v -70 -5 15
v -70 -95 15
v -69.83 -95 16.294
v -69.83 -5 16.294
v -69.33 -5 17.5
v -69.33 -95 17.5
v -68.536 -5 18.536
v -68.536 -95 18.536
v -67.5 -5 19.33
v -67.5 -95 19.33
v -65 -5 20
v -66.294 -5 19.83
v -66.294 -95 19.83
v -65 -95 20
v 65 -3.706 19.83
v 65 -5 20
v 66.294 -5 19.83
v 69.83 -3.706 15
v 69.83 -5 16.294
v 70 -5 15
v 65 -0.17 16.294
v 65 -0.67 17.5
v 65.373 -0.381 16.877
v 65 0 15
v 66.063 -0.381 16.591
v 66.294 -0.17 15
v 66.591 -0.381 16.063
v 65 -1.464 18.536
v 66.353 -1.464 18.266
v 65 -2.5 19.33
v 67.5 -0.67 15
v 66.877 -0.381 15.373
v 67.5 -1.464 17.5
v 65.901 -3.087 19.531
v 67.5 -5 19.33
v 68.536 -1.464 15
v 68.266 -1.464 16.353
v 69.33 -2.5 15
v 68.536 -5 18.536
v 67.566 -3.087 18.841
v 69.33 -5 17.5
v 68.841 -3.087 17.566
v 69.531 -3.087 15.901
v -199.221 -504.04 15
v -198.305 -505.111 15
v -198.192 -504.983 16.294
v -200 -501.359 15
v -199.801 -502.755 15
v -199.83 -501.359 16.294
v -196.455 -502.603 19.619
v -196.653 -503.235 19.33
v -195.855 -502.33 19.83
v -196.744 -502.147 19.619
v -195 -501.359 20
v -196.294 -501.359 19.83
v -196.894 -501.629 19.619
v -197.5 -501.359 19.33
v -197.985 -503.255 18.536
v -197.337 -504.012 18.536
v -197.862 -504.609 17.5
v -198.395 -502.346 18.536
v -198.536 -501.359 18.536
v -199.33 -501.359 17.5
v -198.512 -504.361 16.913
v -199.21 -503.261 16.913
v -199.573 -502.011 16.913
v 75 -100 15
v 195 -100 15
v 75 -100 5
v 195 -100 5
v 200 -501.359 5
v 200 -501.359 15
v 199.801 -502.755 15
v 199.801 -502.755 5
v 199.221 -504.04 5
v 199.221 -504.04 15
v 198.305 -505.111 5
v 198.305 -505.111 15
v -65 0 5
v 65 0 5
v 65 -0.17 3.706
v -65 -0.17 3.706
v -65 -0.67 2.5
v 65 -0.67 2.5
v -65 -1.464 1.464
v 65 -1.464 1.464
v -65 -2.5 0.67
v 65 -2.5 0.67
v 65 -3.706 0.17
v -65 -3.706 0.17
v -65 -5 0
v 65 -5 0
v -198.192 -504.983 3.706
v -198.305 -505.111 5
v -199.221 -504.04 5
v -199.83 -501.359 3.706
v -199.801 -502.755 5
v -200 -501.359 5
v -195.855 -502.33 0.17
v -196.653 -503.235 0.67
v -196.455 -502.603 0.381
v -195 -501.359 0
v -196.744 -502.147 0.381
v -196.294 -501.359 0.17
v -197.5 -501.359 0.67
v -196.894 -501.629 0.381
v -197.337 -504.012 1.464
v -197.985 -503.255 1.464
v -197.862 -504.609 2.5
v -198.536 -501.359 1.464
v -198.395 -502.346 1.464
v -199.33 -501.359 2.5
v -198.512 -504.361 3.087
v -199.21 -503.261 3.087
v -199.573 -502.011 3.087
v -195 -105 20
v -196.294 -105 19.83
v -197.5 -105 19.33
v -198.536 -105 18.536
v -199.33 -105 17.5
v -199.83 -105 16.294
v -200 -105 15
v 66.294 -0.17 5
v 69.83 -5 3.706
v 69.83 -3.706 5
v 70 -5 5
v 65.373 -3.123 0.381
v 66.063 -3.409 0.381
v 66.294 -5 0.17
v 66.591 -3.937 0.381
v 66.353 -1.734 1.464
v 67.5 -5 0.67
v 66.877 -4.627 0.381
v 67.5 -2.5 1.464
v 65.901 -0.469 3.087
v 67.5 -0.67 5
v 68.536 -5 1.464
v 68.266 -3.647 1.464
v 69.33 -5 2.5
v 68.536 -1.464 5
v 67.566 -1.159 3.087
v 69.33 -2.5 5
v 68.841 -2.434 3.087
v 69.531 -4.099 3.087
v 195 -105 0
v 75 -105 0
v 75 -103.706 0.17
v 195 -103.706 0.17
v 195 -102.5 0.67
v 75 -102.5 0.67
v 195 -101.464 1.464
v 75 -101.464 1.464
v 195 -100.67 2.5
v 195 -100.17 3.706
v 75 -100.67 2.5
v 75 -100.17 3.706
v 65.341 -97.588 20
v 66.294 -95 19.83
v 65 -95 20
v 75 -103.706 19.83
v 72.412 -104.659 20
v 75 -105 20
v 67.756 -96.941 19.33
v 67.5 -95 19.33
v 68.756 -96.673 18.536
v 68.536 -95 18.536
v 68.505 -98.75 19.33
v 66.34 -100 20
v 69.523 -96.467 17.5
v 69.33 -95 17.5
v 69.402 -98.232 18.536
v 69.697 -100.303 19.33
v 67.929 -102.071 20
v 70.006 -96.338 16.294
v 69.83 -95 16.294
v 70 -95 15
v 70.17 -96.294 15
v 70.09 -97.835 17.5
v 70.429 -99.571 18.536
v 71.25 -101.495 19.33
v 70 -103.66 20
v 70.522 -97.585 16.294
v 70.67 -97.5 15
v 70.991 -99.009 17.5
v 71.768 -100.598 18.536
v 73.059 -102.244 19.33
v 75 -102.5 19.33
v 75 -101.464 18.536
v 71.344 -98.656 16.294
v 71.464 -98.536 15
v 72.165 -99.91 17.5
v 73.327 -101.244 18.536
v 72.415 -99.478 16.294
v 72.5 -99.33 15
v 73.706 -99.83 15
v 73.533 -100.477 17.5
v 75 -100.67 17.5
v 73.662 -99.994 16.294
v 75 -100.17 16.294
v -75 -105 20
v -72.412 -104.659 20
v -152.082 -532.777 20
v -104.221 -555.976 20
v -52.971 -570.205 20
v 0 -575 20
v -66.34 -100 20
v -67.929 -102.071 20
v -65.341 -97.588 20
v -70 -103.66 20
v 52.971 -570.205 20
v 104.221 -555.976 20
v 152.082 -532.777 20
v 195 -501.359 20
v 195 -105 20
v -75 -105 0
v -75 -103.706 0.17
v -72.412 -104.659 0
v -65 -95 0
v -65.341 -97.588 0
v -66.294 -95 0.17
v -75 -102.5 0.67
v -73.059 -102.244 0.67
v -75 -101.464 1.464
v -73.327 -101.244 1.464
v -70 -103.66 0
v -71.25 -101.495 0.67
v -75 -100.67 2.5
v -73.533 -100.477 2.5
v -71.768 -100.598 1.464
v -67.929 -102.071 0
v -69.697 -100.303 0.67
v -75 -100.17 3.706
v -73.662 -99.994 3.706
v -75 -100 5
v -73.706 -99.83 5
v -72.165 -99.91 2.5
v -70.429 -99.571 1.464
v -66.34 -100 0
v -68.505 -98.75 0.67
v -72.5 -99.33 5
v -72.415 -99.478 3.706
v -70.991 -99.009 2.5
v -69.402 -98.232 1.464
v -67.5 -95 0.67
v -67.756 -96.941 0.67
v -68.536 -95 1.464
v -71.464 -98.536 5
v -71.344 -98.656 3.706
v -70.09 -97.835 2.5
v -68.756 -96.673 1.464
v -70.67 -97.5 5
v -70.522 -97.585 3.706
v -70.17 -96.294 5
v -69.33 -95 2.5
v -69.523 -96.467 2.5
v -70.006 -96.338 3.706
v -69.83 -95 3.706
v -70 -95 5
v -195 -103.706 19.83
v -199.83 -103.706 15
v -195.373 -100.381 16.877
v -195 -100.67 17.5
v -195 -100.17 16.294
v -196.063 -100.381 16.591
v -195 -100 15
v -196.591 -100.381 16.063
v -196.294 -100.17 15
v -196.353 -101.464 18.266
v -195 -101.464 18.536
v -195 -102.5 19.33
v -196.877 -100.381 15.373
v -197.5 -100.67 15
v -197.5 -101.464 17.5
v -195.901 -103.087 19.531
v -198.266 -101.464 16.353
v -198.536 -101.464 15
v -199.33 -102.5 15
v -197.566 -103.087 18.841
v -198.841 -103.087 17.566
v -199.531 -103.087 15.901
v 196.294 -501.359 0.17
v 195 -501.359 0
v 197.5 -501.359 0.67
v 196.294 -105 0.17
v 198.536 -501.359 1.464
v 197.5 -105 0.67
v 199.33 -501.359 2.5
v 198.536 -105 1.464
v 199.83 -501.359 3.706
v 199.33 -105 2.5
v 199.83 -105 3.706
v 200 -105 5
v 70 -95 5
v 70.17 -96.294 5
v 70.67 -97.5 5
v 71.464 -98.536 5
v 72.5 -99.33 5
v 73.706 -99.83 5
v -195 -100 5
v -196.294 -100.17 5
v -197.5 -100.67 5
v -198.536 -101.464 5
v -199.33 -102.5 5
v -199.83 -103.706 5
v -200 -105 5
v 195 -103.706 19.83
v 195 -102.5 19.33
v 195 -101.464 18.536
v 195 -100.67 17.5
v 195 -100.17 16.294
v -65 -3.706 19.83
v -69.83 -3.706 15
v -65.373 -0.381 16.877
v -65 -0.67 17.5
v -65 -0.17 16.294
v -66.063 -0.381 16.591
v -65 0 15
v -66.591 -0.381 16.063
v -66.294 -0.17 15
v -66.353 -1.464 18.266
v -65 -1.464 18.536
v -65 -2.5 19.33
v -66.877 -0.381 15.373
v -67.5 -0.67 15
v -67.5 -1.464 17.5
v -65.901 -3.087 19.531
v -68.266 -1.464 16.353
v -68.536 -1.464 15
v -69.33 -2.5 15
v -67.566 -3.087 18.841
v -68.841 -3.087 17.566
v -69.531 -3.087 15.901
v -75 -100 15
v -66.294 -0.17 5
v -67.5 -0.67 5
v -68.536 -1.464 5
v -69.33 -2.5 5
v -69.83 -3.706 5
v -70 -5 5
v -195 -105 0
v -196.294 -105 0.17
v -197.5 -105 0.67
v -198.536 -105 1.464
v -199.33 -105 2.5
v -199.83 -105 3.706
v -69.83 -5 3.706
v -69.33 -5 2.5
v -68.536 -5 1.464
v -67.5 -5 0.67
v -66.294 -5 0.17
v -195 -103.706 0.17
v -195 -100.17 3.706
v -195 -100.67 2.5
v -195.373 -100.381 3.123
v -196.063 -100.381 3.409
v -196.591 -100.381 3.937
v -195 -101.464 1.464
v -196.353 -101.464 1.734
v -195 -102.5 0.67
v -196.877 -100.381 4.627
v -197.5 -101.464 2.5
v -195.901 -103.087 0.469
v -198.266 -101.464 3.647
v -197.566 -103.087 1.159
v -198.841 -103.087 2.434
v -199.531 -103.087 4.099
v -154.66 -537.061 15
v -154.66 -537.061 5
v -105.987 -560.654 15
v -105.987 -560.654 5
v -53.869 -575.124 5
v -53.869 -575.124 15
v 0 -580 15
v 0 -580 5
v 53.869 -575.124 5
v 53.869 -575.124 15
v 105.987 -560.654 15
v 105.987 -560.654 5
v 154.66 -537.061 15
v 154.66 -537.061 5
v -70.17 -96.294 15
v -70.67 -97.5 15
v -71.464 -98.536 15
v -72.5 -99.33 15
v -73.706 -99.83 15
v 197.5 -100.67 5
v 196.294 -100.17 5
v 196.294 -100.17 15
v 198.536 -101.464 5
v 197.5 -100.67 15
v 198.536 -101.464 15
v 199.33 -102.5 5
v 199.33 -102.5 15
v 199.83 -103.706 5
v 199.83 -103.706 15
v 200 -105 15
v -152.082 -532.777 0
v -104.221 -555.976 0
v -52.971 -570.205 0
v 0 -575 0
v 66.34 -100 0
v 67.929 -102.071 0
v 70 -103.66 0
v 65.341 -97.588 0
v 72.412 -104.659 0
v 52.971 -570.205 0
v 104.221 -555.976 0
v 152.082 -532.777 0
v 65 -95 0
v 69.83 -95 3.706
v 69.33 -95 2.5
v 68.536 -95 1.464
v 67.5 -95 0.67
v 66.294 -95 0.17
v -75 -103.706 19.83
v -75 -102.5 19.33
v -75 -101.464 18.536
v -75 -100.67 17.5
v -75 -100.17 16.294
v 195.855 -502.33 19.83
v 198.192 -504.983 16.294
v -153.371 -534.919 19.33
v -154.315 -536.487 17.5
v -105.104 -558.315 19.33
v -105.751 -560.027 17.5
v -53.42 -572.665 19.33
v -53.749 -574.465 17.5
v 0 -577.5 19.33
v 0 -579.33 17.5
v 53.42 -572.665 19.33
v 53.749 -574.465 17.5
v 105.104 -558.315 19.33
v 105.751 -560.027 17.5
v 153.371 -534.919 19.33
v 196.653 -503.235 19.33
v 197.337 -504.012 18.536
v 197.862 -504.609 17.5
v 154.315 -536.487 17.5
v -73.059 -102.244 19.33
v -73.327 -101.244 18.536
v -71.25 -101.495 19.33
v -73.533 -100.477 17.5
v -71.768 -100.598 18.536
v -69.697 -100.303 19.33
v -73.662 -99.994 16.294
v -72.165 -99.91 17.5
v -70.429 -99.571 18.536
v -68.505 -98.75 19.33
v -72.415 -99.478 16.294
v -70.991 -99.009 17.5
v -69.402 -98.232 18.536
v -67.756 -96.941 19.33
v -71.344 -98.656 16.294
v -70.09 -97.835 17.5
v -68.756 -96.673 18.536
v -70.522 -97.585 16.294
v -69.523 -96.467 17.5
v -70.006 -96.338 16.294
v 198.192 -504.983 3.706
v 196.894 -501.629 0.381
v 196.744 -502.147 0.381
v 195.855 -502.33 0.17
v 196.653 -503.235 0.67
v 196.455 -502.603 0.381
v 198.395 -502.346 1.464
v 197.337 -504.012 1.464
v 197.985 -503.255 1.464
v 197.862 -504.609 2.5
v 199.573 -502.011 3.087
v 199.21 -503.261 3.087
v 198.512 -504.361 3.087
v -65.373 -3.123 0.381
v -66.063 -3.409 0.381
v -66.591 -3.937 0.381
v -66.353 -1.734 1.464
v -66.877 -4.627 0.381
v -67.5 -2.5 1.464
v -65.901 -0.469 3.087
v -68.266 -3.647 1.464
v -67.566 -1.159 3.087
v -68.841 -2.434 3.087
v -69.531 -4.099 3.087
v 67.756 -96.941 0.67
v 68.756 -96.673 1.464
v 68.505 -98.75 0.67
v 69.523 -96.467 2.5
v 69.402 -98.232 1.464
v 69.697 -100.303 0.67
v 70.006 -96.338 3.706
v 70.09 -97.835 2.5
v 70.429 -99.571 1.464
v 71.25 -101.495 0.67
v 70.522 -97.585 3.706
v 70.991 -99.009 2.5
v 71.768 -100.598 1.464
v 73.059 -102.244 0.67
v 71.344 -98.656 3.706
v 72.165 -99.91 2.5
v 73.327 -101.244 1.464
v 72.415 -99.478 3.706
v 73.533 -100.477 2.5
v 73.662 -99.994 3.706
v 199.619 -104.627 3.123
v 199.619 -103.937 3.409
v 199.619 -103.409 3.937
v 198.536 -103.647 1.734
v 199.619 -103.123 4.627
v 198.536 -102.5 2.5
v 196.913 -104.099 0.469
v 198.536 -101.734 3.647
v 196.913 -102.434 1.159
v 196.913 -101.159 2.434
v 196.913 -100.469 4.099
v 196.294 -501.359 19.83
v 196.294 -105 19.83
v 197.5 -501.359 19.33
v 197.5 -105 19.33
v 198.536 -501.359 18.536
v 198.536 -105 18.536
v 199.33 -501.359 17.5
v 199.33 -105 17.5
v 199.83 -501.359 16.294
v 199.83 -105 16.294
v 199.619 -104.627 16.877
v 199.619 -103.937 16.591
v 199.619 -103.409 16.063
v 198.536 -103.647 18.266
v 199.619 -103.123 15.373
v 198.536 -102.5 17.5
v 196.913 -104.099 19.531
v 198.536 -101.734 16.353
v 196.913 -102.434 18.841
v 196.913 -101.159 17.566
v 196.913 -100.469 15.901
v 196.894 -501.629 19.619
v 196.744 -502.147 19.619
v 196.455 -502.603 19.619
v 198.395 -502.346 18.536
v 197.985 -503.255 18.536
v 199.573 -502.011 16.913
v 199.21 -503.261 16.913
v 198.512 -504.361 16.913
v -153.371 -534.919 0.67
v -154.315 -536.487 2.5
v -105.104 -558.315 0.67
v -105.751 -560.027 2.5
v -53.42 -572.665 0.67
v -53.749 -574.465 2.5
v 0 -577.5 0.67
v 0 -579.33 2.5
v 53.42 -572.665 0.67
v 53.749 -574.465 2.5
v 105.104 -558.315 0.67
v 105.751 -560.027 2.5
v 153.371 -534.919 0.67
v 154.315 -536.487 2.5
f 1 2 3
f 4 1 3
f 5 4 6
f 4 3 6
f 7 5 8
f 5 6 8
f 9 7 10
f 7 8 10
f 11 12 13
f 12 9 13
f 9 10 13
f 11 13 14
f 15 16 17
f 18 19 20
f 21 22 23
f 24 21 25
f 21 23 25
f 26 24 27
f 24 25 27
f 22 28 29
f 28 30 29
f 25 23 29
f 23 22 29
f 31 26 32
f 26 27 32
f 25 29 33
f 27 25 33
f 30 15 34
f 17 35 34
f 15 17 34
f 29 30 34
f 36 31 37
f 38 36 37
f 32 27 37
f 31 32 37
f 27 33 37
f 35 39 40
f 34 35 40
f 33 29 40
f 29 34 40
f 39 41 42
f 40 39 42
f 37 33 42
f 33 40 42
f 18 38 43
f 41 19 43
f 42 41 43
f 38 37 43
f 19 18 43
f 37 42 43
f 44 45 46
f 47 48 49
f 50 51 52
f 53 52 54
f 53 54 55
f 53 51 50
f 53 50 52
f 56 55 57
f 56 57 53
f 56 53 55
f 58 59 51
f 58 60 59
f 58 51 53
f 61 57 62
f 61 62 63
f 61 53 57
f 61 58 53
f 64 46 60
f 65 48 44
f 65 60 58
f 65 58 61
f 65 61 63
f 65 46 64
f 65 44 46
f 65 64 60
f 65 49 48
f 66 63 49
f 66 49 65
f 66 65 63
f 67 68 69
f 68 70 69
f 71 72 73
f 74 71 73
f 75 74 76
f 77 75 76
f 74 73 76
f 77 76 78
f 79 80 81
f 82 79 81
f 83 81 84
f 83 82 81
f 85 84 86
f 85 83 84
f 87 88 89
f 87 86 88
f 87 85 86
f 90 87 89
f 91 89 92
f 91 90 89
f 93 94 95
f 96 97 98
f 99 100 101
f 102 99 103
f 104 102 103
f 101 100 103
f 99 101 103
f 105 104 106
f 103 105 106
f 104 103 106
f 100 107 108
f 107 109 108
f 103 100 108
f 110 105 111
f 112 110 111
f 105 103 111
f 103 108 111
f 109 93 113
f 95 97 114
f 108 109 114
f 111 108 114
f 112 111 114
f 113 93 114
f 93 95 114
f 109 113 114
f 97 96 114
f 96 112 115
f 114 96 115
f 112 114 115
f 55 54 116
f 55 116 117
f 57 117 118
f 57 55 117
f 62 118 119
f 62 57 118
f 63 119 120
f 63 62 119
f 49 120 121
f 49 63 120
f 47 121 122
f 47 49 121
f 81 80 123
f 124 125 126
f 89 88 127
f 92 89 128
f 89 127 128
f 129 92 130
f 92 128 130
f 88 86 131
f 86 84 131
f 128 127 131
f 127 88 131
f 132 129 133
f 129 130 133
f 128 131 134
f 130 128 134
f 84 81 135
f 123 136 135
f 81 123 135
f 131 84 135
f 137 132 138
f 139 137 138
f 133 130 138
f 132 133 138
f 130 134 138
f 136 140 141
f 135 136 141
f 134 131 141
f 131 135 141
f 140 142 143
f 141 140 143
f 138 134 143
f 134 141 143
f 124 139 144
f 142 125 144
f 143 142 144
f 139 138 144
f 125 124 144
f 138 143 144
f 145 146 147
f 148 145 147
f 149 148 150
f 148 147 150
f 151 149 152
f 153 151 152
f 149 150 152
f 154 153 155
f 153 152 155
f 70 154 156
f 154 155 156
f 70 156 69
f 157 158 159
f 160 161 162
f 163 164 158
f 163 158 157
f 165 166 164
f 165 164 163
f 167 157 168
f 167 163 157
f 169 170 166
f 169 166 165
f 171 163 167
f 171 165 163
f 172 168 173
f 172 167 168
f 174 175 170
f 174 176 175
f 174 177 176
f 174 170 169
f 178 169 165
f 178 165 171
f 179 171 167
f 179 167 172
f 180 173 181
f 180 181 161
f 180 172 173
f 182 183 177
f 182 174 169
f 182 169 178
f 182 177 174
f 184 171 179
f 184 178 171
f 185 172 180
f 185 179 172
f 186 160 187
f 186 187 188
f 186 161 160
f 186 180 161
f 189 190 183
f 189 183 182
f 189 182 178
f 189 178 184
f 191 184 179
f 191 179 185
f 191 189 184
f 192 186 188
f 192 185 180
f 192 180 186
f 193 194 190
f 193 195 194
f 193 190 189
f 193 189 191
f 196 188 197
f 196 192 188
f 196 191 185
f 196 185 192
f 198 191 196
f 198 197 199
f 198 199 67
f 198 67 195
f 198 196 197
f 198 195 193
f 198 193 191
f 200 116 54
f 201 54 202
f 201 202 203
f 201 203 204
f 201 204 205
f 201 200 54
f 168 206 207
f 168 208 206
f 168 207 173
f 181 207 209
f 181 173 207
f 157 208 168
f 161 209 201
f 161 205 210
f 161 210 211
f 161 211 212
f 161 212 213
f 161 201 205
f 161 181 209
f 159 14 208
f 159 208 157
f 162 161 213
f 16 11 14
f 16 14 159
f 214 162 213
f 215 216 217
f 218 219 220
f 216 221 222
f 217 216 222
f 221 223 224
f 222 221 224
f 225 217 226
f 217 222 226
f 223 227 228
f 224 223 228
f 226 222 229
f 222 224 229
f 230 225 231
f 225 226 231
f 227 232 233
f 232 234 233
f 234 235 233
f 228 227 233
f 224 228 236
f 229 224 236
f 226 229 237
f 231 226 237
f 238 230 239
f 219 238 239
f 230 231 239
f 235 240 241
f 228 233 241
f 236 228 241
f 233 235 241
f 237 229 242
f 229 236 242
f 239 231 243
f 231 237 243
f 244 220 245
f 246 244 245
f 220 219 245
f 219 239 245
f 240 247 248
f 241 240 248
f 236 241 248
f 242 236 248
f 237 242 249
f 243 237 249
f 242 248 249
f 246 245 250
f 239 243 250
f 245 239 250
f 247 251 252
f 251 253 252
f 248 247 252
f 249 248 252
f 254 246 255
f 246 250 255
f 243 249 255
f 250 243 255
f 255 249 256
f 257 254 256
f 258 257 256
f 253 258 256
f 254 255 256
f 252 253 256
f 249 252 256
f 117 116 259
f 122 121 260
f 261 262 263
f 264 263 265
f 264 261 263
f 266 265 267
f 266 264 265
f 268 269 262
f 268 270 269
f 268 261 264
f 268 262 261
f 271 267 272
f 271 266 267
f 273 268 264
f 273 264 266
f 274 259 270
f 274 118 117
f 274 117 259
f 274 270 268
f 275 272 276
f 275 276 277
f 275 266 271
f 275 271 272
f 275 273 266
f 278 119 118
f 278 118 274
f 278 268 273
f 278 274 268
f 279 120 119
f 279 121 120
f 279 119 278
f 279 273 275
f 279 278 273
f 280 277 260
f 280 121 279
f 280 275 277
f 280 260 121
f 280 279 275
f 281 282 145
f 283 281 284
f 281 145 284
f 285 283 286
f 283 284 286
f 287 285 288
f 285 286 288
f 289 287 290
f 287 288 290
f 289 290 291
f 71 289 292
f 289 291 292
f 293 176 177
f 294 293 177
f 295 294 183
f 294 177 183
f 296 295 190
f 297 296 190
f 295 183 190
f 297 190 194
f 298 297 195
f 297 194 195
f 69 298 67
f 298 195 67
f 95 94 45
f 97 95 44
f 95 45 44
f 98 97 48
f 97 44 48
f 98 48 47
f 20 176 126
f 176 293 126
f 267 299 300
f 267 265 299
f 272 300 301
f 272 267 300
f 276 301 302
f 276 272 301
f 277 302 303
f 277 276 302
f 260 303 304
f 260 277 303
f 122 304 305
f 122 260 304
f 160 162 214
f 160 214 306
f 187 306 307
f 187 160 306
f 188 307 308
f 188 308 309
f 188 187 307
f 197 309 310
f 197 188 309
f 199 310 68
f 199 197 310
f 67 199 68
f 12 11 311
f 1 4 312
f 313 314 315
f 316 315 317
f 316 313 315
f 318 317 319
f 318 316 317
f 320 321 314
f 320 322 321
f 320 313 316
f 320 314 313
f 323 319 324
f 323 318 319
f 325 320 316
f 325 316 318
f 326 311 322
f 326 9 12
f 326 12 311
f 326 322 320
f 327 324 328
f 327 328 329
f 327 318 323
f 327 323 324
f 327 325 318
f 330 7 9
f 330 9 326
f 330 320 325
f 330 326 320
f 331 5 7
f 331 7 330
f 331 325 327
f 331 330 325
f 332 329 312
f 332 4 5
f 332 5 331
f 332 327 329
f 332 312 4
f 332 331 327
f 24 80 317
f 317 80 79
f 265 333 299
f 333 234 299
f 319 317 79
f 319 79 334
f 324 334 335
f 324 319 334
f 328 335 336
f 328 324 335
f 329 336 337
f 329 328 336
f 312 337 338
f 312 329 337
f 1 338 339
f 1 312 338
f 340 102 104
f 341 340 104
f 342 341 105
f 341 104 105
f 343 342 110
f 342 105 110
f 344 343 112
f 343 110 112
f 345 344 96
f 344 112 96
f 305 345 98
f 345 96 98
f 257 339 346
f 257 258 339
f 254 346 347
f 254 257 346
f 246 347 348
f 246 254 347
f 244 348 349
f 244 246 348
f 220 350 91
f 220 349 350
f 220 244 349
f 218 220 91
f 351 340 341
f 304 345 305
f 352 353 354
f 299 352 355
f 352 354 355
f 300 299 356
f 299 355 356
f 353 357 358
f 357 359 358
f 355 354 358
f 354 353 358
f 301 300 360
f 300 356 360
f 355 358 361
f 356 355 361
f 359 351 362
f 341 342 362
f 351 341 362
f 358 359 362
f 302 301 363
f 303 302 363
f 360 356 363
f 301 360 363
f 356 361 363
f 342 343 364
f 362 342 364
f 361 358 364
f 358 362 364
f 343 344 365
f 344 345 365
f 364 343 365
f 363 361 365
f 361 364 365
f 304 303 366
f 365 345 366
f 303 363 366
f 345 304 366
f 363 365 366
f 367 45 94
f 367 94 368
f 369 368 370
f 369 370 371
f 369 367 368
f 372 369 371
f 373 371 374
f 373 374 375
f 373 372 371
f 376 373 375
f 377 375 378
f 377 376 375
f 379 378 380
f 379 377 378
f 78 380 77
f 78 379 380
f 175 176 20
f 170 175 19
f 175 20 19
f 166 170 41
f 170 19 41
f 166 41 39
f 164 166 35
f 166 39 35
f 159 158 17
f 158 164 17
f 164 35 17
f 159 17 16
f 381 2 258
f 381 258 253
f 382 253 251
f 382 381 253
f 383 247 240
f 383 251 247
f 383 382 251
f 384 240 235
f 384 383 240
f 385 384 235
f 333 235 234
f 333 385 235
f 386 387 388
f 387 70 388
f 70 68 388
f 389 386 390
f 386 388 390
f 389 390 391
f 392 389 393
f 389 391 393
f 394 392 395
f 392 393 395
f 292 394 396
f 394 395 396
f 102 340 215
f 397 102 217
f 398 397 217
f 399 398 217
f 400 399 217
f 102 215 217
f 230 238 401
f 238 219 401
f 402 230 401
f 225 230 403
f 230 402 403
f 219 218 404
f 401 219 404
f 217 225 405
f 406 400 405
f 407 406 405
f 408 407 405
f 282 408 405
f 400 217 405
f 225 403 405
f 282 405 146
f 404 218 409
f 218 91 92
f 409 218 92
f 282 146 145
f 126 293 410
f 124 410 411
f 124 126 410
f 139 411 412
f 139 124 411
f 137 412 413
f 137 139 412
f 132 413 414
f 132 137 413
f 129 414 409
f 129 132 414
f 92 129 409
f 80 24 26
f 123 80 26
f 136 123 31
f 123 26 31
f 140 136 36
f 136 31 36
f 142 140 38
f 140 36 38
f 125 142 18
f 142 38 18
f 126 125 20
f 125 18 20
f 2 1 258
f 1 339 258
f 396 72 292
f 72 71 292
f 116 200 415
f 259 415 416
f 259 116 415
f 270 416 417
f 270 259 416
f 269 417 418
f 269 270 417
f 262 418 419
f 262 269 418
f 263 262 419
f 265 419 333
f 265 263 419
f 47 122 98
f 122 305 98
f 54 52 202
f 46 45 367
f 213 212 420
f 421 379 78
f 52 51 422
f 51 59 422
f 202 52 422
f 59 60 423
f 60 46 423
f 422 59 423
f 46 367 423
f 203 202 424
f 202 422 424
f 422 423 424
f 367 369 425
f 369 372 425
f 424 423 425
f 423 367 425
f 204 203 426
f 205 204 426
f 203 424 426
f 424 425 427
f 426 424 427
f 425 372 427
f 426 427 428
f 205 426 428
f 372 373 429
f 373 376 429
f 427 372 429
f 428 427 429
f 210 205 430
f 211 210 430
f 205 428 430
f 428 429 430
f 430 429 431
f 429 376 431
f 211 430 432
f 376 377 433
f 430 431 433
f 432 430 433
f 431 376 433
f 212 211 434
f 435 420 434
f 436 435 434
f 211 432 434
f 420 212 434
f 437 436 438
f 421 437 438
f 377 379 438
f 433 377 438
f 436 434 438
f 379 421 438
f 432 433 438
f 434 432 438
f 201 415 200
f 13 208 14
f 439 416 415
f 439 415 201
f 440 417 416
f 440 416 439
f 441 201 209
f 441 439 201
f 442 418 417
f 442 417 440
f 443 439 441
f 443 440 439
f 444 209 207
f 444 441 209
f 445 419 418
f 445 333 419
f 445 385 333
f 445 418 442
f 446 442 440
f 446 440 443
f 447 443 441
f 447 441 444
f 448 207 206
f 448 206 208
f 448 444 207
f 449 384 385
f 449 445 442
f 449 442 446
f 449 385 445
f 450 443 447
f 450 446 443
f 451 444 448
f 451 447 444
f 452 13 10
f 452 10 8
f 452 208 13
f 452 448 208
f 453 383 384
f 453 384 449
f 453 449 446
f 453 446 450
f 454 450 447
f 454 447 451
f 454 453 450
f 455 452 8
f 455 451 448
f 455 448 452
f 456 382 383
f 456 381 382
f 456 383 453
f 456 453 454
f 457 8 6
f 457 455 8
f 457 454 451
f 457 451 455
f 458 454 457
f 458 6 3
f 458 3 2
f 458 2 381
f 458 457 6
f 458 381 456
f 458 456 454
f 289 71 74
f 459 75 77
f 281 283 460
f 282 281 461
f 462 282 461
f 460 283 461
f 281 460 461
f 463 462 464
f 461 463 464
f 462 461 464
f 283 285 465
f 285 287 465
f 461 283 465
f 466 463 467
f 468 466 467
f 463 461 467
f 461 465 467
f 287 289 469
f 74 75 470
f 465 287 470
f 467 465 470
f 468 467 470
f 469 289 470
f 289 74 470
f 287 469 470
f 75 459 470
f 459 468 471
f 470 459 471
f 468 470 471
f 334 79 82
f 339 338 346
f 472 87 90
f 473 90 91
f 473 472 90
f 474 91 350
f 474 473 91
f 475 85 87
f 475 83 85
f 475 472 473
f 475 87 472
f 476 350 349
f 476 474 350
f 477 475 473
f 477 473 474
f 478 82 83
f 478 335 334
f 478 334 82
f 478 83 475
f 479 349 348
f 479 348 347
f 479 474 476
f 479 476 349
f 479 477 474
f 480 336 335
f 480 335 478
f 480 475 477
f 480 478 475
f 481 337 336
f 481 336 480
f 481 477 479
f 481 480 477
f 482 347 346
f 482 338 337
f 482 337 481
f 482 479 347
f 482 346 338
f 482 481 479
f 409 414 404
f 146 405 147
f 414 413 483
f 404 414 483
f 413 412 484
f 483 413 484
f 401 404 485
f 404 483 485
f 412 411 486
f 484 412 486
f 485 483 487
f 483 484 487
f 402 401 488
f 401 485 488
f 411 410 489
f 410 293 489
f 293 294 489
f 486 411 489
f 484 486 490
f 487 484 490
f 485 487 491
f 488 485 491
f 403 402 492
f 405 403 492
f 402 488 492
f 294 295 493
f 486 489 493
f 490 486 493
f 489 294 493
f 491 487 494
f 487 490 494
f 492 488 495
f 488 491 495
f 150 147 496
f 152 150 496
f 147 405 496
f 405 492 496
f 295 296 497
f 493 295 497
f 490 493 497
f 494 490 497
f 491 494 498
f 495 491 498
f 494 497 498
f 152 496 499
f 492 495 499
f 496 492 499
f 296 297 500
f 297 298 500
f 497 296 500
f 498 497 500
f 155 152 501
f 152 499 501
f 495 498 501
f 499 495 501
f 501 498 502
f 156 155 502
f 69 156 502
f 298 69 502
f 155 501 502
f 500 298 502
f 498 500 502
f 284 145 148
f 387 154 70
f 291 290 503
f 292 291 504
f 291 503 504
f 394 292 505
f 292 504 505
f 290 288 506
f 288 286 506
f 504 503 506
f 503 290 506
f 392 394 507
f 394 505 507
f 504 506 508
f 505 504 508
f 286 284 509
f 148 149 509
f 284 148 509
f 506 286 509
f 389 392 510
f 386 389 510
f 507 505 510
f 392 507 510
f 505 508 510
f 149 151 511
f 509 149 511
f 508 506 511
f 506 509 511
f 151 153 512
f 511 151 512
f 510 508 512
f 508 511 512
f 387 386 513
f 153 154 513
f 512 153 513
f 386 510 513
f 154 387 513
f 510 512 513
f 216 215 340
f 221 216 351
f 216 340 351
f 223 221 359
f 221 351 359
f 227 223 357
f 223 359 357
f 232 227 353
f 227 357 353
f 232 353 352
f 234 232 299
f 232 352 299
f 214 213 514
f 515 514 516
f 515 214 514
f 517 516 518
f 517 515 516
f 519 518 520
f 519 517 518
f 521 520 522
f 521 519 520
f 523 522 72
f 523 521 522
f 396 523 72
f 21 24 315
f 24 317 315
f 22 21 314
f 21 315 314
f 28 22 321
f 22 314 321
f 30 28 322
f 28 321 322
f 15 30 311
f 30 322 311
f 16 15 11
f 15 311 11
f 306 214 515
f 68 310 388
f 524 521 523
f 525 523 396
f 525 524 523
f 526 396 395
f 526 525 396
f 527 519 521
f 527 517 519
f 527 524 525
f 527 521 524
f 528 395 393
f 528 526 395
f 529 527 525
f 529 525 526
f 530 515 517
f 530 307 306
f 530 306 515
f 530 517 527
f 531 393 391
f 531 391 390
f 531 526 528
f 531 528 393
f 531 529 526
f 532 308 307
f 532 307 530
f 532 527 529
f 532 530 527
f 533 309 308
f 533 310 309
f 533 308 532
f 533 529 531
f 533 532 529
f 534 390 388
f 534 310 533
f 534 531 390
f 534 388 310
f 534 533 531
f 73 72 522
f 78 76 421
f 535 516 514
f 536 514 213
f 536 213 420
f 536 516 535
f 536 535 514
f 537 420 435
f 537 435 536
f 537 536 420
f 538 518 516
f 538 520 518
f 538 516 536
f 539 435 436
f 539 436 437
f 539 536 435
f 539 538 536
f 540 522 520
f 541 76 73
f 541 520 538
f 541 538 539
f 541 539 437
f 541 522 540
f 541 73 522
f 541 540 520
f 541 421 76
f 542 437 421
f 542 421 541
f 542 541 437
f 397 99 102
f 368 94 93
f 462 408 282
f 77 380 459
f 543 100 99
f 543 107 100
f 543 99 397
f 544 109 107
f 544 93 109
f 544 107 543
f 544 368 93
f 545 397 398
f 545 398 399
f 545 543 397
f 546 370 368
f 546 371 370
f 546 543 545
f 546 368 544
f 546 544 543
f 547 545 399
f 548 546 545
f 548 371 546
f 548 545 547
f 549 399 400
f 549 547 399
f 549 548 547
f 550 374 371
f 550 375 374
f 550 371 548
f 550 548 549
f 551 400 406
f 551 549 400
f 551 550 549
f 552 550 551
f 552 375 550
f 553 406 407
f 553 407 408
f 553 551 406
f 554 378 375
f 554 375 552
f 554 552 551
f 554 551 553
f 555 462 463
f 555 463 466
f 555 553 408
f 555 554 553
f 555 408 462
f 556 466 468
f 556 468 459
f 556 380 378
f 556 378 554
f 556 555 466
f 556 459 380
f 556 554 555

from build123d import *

# Parameters (mm, degrees)
F1_DEPTH = 20
F2_R     = 300
F3_DEPTH = 20.001
F4_R     = 5


with BuildPart() as f1:
    # F0 (on Top) → F1 (new body)
    with BuildSketch(Plane.XY):
        Polygon((70, 0), (-70, 0), (-70, -100), (-200, -100), (-200, -600), (200, -600), (200, -100), (70, -100), align=None)
    extrude(amount=F1_DEPTH)

    # F2 (on face) → F3 (intersect, through all)
    with BuildSketch(Plane.XY.offset(20)):
        with Locations((0, -280)):
            Circle(F2_R)
    extrude(amount=-F3_DEPTH, mode=Mode.INTERSECT)

    # F4
    f4_edges = [f1.edges().sort_by_distance(p)[0] for p in [
        (70, -50, 20),
        (135, -100, 20),
        (200, -301.803399, 20),
        (0, -580, 20),
        (-200, -301.803399, 20),
        (-135, -100, 20),
        (-70, -50, 20),
        (0, 0, 20),
        (70, 0, 10),
        (-70, 0, 10),
        (0, 0, 0),
        (70, -50, 0),
        (135, -100, 0),
        (200, -301.803399, 0),
        (0, -580, 0),
        (-200, -301.803399, 0),
        (-135, -100, 0),
        (-70, -50, 0),
        (200, -100, 10),
        (70, -100, 10),
        (-70, -100, 10),
        (-200, -100, 10),
        (200, -503.606798, 10),
        (-200, -503.606798, 10),
    ]]
    fillet(f4_edges, radius=F4_R)


solid = f1.part
